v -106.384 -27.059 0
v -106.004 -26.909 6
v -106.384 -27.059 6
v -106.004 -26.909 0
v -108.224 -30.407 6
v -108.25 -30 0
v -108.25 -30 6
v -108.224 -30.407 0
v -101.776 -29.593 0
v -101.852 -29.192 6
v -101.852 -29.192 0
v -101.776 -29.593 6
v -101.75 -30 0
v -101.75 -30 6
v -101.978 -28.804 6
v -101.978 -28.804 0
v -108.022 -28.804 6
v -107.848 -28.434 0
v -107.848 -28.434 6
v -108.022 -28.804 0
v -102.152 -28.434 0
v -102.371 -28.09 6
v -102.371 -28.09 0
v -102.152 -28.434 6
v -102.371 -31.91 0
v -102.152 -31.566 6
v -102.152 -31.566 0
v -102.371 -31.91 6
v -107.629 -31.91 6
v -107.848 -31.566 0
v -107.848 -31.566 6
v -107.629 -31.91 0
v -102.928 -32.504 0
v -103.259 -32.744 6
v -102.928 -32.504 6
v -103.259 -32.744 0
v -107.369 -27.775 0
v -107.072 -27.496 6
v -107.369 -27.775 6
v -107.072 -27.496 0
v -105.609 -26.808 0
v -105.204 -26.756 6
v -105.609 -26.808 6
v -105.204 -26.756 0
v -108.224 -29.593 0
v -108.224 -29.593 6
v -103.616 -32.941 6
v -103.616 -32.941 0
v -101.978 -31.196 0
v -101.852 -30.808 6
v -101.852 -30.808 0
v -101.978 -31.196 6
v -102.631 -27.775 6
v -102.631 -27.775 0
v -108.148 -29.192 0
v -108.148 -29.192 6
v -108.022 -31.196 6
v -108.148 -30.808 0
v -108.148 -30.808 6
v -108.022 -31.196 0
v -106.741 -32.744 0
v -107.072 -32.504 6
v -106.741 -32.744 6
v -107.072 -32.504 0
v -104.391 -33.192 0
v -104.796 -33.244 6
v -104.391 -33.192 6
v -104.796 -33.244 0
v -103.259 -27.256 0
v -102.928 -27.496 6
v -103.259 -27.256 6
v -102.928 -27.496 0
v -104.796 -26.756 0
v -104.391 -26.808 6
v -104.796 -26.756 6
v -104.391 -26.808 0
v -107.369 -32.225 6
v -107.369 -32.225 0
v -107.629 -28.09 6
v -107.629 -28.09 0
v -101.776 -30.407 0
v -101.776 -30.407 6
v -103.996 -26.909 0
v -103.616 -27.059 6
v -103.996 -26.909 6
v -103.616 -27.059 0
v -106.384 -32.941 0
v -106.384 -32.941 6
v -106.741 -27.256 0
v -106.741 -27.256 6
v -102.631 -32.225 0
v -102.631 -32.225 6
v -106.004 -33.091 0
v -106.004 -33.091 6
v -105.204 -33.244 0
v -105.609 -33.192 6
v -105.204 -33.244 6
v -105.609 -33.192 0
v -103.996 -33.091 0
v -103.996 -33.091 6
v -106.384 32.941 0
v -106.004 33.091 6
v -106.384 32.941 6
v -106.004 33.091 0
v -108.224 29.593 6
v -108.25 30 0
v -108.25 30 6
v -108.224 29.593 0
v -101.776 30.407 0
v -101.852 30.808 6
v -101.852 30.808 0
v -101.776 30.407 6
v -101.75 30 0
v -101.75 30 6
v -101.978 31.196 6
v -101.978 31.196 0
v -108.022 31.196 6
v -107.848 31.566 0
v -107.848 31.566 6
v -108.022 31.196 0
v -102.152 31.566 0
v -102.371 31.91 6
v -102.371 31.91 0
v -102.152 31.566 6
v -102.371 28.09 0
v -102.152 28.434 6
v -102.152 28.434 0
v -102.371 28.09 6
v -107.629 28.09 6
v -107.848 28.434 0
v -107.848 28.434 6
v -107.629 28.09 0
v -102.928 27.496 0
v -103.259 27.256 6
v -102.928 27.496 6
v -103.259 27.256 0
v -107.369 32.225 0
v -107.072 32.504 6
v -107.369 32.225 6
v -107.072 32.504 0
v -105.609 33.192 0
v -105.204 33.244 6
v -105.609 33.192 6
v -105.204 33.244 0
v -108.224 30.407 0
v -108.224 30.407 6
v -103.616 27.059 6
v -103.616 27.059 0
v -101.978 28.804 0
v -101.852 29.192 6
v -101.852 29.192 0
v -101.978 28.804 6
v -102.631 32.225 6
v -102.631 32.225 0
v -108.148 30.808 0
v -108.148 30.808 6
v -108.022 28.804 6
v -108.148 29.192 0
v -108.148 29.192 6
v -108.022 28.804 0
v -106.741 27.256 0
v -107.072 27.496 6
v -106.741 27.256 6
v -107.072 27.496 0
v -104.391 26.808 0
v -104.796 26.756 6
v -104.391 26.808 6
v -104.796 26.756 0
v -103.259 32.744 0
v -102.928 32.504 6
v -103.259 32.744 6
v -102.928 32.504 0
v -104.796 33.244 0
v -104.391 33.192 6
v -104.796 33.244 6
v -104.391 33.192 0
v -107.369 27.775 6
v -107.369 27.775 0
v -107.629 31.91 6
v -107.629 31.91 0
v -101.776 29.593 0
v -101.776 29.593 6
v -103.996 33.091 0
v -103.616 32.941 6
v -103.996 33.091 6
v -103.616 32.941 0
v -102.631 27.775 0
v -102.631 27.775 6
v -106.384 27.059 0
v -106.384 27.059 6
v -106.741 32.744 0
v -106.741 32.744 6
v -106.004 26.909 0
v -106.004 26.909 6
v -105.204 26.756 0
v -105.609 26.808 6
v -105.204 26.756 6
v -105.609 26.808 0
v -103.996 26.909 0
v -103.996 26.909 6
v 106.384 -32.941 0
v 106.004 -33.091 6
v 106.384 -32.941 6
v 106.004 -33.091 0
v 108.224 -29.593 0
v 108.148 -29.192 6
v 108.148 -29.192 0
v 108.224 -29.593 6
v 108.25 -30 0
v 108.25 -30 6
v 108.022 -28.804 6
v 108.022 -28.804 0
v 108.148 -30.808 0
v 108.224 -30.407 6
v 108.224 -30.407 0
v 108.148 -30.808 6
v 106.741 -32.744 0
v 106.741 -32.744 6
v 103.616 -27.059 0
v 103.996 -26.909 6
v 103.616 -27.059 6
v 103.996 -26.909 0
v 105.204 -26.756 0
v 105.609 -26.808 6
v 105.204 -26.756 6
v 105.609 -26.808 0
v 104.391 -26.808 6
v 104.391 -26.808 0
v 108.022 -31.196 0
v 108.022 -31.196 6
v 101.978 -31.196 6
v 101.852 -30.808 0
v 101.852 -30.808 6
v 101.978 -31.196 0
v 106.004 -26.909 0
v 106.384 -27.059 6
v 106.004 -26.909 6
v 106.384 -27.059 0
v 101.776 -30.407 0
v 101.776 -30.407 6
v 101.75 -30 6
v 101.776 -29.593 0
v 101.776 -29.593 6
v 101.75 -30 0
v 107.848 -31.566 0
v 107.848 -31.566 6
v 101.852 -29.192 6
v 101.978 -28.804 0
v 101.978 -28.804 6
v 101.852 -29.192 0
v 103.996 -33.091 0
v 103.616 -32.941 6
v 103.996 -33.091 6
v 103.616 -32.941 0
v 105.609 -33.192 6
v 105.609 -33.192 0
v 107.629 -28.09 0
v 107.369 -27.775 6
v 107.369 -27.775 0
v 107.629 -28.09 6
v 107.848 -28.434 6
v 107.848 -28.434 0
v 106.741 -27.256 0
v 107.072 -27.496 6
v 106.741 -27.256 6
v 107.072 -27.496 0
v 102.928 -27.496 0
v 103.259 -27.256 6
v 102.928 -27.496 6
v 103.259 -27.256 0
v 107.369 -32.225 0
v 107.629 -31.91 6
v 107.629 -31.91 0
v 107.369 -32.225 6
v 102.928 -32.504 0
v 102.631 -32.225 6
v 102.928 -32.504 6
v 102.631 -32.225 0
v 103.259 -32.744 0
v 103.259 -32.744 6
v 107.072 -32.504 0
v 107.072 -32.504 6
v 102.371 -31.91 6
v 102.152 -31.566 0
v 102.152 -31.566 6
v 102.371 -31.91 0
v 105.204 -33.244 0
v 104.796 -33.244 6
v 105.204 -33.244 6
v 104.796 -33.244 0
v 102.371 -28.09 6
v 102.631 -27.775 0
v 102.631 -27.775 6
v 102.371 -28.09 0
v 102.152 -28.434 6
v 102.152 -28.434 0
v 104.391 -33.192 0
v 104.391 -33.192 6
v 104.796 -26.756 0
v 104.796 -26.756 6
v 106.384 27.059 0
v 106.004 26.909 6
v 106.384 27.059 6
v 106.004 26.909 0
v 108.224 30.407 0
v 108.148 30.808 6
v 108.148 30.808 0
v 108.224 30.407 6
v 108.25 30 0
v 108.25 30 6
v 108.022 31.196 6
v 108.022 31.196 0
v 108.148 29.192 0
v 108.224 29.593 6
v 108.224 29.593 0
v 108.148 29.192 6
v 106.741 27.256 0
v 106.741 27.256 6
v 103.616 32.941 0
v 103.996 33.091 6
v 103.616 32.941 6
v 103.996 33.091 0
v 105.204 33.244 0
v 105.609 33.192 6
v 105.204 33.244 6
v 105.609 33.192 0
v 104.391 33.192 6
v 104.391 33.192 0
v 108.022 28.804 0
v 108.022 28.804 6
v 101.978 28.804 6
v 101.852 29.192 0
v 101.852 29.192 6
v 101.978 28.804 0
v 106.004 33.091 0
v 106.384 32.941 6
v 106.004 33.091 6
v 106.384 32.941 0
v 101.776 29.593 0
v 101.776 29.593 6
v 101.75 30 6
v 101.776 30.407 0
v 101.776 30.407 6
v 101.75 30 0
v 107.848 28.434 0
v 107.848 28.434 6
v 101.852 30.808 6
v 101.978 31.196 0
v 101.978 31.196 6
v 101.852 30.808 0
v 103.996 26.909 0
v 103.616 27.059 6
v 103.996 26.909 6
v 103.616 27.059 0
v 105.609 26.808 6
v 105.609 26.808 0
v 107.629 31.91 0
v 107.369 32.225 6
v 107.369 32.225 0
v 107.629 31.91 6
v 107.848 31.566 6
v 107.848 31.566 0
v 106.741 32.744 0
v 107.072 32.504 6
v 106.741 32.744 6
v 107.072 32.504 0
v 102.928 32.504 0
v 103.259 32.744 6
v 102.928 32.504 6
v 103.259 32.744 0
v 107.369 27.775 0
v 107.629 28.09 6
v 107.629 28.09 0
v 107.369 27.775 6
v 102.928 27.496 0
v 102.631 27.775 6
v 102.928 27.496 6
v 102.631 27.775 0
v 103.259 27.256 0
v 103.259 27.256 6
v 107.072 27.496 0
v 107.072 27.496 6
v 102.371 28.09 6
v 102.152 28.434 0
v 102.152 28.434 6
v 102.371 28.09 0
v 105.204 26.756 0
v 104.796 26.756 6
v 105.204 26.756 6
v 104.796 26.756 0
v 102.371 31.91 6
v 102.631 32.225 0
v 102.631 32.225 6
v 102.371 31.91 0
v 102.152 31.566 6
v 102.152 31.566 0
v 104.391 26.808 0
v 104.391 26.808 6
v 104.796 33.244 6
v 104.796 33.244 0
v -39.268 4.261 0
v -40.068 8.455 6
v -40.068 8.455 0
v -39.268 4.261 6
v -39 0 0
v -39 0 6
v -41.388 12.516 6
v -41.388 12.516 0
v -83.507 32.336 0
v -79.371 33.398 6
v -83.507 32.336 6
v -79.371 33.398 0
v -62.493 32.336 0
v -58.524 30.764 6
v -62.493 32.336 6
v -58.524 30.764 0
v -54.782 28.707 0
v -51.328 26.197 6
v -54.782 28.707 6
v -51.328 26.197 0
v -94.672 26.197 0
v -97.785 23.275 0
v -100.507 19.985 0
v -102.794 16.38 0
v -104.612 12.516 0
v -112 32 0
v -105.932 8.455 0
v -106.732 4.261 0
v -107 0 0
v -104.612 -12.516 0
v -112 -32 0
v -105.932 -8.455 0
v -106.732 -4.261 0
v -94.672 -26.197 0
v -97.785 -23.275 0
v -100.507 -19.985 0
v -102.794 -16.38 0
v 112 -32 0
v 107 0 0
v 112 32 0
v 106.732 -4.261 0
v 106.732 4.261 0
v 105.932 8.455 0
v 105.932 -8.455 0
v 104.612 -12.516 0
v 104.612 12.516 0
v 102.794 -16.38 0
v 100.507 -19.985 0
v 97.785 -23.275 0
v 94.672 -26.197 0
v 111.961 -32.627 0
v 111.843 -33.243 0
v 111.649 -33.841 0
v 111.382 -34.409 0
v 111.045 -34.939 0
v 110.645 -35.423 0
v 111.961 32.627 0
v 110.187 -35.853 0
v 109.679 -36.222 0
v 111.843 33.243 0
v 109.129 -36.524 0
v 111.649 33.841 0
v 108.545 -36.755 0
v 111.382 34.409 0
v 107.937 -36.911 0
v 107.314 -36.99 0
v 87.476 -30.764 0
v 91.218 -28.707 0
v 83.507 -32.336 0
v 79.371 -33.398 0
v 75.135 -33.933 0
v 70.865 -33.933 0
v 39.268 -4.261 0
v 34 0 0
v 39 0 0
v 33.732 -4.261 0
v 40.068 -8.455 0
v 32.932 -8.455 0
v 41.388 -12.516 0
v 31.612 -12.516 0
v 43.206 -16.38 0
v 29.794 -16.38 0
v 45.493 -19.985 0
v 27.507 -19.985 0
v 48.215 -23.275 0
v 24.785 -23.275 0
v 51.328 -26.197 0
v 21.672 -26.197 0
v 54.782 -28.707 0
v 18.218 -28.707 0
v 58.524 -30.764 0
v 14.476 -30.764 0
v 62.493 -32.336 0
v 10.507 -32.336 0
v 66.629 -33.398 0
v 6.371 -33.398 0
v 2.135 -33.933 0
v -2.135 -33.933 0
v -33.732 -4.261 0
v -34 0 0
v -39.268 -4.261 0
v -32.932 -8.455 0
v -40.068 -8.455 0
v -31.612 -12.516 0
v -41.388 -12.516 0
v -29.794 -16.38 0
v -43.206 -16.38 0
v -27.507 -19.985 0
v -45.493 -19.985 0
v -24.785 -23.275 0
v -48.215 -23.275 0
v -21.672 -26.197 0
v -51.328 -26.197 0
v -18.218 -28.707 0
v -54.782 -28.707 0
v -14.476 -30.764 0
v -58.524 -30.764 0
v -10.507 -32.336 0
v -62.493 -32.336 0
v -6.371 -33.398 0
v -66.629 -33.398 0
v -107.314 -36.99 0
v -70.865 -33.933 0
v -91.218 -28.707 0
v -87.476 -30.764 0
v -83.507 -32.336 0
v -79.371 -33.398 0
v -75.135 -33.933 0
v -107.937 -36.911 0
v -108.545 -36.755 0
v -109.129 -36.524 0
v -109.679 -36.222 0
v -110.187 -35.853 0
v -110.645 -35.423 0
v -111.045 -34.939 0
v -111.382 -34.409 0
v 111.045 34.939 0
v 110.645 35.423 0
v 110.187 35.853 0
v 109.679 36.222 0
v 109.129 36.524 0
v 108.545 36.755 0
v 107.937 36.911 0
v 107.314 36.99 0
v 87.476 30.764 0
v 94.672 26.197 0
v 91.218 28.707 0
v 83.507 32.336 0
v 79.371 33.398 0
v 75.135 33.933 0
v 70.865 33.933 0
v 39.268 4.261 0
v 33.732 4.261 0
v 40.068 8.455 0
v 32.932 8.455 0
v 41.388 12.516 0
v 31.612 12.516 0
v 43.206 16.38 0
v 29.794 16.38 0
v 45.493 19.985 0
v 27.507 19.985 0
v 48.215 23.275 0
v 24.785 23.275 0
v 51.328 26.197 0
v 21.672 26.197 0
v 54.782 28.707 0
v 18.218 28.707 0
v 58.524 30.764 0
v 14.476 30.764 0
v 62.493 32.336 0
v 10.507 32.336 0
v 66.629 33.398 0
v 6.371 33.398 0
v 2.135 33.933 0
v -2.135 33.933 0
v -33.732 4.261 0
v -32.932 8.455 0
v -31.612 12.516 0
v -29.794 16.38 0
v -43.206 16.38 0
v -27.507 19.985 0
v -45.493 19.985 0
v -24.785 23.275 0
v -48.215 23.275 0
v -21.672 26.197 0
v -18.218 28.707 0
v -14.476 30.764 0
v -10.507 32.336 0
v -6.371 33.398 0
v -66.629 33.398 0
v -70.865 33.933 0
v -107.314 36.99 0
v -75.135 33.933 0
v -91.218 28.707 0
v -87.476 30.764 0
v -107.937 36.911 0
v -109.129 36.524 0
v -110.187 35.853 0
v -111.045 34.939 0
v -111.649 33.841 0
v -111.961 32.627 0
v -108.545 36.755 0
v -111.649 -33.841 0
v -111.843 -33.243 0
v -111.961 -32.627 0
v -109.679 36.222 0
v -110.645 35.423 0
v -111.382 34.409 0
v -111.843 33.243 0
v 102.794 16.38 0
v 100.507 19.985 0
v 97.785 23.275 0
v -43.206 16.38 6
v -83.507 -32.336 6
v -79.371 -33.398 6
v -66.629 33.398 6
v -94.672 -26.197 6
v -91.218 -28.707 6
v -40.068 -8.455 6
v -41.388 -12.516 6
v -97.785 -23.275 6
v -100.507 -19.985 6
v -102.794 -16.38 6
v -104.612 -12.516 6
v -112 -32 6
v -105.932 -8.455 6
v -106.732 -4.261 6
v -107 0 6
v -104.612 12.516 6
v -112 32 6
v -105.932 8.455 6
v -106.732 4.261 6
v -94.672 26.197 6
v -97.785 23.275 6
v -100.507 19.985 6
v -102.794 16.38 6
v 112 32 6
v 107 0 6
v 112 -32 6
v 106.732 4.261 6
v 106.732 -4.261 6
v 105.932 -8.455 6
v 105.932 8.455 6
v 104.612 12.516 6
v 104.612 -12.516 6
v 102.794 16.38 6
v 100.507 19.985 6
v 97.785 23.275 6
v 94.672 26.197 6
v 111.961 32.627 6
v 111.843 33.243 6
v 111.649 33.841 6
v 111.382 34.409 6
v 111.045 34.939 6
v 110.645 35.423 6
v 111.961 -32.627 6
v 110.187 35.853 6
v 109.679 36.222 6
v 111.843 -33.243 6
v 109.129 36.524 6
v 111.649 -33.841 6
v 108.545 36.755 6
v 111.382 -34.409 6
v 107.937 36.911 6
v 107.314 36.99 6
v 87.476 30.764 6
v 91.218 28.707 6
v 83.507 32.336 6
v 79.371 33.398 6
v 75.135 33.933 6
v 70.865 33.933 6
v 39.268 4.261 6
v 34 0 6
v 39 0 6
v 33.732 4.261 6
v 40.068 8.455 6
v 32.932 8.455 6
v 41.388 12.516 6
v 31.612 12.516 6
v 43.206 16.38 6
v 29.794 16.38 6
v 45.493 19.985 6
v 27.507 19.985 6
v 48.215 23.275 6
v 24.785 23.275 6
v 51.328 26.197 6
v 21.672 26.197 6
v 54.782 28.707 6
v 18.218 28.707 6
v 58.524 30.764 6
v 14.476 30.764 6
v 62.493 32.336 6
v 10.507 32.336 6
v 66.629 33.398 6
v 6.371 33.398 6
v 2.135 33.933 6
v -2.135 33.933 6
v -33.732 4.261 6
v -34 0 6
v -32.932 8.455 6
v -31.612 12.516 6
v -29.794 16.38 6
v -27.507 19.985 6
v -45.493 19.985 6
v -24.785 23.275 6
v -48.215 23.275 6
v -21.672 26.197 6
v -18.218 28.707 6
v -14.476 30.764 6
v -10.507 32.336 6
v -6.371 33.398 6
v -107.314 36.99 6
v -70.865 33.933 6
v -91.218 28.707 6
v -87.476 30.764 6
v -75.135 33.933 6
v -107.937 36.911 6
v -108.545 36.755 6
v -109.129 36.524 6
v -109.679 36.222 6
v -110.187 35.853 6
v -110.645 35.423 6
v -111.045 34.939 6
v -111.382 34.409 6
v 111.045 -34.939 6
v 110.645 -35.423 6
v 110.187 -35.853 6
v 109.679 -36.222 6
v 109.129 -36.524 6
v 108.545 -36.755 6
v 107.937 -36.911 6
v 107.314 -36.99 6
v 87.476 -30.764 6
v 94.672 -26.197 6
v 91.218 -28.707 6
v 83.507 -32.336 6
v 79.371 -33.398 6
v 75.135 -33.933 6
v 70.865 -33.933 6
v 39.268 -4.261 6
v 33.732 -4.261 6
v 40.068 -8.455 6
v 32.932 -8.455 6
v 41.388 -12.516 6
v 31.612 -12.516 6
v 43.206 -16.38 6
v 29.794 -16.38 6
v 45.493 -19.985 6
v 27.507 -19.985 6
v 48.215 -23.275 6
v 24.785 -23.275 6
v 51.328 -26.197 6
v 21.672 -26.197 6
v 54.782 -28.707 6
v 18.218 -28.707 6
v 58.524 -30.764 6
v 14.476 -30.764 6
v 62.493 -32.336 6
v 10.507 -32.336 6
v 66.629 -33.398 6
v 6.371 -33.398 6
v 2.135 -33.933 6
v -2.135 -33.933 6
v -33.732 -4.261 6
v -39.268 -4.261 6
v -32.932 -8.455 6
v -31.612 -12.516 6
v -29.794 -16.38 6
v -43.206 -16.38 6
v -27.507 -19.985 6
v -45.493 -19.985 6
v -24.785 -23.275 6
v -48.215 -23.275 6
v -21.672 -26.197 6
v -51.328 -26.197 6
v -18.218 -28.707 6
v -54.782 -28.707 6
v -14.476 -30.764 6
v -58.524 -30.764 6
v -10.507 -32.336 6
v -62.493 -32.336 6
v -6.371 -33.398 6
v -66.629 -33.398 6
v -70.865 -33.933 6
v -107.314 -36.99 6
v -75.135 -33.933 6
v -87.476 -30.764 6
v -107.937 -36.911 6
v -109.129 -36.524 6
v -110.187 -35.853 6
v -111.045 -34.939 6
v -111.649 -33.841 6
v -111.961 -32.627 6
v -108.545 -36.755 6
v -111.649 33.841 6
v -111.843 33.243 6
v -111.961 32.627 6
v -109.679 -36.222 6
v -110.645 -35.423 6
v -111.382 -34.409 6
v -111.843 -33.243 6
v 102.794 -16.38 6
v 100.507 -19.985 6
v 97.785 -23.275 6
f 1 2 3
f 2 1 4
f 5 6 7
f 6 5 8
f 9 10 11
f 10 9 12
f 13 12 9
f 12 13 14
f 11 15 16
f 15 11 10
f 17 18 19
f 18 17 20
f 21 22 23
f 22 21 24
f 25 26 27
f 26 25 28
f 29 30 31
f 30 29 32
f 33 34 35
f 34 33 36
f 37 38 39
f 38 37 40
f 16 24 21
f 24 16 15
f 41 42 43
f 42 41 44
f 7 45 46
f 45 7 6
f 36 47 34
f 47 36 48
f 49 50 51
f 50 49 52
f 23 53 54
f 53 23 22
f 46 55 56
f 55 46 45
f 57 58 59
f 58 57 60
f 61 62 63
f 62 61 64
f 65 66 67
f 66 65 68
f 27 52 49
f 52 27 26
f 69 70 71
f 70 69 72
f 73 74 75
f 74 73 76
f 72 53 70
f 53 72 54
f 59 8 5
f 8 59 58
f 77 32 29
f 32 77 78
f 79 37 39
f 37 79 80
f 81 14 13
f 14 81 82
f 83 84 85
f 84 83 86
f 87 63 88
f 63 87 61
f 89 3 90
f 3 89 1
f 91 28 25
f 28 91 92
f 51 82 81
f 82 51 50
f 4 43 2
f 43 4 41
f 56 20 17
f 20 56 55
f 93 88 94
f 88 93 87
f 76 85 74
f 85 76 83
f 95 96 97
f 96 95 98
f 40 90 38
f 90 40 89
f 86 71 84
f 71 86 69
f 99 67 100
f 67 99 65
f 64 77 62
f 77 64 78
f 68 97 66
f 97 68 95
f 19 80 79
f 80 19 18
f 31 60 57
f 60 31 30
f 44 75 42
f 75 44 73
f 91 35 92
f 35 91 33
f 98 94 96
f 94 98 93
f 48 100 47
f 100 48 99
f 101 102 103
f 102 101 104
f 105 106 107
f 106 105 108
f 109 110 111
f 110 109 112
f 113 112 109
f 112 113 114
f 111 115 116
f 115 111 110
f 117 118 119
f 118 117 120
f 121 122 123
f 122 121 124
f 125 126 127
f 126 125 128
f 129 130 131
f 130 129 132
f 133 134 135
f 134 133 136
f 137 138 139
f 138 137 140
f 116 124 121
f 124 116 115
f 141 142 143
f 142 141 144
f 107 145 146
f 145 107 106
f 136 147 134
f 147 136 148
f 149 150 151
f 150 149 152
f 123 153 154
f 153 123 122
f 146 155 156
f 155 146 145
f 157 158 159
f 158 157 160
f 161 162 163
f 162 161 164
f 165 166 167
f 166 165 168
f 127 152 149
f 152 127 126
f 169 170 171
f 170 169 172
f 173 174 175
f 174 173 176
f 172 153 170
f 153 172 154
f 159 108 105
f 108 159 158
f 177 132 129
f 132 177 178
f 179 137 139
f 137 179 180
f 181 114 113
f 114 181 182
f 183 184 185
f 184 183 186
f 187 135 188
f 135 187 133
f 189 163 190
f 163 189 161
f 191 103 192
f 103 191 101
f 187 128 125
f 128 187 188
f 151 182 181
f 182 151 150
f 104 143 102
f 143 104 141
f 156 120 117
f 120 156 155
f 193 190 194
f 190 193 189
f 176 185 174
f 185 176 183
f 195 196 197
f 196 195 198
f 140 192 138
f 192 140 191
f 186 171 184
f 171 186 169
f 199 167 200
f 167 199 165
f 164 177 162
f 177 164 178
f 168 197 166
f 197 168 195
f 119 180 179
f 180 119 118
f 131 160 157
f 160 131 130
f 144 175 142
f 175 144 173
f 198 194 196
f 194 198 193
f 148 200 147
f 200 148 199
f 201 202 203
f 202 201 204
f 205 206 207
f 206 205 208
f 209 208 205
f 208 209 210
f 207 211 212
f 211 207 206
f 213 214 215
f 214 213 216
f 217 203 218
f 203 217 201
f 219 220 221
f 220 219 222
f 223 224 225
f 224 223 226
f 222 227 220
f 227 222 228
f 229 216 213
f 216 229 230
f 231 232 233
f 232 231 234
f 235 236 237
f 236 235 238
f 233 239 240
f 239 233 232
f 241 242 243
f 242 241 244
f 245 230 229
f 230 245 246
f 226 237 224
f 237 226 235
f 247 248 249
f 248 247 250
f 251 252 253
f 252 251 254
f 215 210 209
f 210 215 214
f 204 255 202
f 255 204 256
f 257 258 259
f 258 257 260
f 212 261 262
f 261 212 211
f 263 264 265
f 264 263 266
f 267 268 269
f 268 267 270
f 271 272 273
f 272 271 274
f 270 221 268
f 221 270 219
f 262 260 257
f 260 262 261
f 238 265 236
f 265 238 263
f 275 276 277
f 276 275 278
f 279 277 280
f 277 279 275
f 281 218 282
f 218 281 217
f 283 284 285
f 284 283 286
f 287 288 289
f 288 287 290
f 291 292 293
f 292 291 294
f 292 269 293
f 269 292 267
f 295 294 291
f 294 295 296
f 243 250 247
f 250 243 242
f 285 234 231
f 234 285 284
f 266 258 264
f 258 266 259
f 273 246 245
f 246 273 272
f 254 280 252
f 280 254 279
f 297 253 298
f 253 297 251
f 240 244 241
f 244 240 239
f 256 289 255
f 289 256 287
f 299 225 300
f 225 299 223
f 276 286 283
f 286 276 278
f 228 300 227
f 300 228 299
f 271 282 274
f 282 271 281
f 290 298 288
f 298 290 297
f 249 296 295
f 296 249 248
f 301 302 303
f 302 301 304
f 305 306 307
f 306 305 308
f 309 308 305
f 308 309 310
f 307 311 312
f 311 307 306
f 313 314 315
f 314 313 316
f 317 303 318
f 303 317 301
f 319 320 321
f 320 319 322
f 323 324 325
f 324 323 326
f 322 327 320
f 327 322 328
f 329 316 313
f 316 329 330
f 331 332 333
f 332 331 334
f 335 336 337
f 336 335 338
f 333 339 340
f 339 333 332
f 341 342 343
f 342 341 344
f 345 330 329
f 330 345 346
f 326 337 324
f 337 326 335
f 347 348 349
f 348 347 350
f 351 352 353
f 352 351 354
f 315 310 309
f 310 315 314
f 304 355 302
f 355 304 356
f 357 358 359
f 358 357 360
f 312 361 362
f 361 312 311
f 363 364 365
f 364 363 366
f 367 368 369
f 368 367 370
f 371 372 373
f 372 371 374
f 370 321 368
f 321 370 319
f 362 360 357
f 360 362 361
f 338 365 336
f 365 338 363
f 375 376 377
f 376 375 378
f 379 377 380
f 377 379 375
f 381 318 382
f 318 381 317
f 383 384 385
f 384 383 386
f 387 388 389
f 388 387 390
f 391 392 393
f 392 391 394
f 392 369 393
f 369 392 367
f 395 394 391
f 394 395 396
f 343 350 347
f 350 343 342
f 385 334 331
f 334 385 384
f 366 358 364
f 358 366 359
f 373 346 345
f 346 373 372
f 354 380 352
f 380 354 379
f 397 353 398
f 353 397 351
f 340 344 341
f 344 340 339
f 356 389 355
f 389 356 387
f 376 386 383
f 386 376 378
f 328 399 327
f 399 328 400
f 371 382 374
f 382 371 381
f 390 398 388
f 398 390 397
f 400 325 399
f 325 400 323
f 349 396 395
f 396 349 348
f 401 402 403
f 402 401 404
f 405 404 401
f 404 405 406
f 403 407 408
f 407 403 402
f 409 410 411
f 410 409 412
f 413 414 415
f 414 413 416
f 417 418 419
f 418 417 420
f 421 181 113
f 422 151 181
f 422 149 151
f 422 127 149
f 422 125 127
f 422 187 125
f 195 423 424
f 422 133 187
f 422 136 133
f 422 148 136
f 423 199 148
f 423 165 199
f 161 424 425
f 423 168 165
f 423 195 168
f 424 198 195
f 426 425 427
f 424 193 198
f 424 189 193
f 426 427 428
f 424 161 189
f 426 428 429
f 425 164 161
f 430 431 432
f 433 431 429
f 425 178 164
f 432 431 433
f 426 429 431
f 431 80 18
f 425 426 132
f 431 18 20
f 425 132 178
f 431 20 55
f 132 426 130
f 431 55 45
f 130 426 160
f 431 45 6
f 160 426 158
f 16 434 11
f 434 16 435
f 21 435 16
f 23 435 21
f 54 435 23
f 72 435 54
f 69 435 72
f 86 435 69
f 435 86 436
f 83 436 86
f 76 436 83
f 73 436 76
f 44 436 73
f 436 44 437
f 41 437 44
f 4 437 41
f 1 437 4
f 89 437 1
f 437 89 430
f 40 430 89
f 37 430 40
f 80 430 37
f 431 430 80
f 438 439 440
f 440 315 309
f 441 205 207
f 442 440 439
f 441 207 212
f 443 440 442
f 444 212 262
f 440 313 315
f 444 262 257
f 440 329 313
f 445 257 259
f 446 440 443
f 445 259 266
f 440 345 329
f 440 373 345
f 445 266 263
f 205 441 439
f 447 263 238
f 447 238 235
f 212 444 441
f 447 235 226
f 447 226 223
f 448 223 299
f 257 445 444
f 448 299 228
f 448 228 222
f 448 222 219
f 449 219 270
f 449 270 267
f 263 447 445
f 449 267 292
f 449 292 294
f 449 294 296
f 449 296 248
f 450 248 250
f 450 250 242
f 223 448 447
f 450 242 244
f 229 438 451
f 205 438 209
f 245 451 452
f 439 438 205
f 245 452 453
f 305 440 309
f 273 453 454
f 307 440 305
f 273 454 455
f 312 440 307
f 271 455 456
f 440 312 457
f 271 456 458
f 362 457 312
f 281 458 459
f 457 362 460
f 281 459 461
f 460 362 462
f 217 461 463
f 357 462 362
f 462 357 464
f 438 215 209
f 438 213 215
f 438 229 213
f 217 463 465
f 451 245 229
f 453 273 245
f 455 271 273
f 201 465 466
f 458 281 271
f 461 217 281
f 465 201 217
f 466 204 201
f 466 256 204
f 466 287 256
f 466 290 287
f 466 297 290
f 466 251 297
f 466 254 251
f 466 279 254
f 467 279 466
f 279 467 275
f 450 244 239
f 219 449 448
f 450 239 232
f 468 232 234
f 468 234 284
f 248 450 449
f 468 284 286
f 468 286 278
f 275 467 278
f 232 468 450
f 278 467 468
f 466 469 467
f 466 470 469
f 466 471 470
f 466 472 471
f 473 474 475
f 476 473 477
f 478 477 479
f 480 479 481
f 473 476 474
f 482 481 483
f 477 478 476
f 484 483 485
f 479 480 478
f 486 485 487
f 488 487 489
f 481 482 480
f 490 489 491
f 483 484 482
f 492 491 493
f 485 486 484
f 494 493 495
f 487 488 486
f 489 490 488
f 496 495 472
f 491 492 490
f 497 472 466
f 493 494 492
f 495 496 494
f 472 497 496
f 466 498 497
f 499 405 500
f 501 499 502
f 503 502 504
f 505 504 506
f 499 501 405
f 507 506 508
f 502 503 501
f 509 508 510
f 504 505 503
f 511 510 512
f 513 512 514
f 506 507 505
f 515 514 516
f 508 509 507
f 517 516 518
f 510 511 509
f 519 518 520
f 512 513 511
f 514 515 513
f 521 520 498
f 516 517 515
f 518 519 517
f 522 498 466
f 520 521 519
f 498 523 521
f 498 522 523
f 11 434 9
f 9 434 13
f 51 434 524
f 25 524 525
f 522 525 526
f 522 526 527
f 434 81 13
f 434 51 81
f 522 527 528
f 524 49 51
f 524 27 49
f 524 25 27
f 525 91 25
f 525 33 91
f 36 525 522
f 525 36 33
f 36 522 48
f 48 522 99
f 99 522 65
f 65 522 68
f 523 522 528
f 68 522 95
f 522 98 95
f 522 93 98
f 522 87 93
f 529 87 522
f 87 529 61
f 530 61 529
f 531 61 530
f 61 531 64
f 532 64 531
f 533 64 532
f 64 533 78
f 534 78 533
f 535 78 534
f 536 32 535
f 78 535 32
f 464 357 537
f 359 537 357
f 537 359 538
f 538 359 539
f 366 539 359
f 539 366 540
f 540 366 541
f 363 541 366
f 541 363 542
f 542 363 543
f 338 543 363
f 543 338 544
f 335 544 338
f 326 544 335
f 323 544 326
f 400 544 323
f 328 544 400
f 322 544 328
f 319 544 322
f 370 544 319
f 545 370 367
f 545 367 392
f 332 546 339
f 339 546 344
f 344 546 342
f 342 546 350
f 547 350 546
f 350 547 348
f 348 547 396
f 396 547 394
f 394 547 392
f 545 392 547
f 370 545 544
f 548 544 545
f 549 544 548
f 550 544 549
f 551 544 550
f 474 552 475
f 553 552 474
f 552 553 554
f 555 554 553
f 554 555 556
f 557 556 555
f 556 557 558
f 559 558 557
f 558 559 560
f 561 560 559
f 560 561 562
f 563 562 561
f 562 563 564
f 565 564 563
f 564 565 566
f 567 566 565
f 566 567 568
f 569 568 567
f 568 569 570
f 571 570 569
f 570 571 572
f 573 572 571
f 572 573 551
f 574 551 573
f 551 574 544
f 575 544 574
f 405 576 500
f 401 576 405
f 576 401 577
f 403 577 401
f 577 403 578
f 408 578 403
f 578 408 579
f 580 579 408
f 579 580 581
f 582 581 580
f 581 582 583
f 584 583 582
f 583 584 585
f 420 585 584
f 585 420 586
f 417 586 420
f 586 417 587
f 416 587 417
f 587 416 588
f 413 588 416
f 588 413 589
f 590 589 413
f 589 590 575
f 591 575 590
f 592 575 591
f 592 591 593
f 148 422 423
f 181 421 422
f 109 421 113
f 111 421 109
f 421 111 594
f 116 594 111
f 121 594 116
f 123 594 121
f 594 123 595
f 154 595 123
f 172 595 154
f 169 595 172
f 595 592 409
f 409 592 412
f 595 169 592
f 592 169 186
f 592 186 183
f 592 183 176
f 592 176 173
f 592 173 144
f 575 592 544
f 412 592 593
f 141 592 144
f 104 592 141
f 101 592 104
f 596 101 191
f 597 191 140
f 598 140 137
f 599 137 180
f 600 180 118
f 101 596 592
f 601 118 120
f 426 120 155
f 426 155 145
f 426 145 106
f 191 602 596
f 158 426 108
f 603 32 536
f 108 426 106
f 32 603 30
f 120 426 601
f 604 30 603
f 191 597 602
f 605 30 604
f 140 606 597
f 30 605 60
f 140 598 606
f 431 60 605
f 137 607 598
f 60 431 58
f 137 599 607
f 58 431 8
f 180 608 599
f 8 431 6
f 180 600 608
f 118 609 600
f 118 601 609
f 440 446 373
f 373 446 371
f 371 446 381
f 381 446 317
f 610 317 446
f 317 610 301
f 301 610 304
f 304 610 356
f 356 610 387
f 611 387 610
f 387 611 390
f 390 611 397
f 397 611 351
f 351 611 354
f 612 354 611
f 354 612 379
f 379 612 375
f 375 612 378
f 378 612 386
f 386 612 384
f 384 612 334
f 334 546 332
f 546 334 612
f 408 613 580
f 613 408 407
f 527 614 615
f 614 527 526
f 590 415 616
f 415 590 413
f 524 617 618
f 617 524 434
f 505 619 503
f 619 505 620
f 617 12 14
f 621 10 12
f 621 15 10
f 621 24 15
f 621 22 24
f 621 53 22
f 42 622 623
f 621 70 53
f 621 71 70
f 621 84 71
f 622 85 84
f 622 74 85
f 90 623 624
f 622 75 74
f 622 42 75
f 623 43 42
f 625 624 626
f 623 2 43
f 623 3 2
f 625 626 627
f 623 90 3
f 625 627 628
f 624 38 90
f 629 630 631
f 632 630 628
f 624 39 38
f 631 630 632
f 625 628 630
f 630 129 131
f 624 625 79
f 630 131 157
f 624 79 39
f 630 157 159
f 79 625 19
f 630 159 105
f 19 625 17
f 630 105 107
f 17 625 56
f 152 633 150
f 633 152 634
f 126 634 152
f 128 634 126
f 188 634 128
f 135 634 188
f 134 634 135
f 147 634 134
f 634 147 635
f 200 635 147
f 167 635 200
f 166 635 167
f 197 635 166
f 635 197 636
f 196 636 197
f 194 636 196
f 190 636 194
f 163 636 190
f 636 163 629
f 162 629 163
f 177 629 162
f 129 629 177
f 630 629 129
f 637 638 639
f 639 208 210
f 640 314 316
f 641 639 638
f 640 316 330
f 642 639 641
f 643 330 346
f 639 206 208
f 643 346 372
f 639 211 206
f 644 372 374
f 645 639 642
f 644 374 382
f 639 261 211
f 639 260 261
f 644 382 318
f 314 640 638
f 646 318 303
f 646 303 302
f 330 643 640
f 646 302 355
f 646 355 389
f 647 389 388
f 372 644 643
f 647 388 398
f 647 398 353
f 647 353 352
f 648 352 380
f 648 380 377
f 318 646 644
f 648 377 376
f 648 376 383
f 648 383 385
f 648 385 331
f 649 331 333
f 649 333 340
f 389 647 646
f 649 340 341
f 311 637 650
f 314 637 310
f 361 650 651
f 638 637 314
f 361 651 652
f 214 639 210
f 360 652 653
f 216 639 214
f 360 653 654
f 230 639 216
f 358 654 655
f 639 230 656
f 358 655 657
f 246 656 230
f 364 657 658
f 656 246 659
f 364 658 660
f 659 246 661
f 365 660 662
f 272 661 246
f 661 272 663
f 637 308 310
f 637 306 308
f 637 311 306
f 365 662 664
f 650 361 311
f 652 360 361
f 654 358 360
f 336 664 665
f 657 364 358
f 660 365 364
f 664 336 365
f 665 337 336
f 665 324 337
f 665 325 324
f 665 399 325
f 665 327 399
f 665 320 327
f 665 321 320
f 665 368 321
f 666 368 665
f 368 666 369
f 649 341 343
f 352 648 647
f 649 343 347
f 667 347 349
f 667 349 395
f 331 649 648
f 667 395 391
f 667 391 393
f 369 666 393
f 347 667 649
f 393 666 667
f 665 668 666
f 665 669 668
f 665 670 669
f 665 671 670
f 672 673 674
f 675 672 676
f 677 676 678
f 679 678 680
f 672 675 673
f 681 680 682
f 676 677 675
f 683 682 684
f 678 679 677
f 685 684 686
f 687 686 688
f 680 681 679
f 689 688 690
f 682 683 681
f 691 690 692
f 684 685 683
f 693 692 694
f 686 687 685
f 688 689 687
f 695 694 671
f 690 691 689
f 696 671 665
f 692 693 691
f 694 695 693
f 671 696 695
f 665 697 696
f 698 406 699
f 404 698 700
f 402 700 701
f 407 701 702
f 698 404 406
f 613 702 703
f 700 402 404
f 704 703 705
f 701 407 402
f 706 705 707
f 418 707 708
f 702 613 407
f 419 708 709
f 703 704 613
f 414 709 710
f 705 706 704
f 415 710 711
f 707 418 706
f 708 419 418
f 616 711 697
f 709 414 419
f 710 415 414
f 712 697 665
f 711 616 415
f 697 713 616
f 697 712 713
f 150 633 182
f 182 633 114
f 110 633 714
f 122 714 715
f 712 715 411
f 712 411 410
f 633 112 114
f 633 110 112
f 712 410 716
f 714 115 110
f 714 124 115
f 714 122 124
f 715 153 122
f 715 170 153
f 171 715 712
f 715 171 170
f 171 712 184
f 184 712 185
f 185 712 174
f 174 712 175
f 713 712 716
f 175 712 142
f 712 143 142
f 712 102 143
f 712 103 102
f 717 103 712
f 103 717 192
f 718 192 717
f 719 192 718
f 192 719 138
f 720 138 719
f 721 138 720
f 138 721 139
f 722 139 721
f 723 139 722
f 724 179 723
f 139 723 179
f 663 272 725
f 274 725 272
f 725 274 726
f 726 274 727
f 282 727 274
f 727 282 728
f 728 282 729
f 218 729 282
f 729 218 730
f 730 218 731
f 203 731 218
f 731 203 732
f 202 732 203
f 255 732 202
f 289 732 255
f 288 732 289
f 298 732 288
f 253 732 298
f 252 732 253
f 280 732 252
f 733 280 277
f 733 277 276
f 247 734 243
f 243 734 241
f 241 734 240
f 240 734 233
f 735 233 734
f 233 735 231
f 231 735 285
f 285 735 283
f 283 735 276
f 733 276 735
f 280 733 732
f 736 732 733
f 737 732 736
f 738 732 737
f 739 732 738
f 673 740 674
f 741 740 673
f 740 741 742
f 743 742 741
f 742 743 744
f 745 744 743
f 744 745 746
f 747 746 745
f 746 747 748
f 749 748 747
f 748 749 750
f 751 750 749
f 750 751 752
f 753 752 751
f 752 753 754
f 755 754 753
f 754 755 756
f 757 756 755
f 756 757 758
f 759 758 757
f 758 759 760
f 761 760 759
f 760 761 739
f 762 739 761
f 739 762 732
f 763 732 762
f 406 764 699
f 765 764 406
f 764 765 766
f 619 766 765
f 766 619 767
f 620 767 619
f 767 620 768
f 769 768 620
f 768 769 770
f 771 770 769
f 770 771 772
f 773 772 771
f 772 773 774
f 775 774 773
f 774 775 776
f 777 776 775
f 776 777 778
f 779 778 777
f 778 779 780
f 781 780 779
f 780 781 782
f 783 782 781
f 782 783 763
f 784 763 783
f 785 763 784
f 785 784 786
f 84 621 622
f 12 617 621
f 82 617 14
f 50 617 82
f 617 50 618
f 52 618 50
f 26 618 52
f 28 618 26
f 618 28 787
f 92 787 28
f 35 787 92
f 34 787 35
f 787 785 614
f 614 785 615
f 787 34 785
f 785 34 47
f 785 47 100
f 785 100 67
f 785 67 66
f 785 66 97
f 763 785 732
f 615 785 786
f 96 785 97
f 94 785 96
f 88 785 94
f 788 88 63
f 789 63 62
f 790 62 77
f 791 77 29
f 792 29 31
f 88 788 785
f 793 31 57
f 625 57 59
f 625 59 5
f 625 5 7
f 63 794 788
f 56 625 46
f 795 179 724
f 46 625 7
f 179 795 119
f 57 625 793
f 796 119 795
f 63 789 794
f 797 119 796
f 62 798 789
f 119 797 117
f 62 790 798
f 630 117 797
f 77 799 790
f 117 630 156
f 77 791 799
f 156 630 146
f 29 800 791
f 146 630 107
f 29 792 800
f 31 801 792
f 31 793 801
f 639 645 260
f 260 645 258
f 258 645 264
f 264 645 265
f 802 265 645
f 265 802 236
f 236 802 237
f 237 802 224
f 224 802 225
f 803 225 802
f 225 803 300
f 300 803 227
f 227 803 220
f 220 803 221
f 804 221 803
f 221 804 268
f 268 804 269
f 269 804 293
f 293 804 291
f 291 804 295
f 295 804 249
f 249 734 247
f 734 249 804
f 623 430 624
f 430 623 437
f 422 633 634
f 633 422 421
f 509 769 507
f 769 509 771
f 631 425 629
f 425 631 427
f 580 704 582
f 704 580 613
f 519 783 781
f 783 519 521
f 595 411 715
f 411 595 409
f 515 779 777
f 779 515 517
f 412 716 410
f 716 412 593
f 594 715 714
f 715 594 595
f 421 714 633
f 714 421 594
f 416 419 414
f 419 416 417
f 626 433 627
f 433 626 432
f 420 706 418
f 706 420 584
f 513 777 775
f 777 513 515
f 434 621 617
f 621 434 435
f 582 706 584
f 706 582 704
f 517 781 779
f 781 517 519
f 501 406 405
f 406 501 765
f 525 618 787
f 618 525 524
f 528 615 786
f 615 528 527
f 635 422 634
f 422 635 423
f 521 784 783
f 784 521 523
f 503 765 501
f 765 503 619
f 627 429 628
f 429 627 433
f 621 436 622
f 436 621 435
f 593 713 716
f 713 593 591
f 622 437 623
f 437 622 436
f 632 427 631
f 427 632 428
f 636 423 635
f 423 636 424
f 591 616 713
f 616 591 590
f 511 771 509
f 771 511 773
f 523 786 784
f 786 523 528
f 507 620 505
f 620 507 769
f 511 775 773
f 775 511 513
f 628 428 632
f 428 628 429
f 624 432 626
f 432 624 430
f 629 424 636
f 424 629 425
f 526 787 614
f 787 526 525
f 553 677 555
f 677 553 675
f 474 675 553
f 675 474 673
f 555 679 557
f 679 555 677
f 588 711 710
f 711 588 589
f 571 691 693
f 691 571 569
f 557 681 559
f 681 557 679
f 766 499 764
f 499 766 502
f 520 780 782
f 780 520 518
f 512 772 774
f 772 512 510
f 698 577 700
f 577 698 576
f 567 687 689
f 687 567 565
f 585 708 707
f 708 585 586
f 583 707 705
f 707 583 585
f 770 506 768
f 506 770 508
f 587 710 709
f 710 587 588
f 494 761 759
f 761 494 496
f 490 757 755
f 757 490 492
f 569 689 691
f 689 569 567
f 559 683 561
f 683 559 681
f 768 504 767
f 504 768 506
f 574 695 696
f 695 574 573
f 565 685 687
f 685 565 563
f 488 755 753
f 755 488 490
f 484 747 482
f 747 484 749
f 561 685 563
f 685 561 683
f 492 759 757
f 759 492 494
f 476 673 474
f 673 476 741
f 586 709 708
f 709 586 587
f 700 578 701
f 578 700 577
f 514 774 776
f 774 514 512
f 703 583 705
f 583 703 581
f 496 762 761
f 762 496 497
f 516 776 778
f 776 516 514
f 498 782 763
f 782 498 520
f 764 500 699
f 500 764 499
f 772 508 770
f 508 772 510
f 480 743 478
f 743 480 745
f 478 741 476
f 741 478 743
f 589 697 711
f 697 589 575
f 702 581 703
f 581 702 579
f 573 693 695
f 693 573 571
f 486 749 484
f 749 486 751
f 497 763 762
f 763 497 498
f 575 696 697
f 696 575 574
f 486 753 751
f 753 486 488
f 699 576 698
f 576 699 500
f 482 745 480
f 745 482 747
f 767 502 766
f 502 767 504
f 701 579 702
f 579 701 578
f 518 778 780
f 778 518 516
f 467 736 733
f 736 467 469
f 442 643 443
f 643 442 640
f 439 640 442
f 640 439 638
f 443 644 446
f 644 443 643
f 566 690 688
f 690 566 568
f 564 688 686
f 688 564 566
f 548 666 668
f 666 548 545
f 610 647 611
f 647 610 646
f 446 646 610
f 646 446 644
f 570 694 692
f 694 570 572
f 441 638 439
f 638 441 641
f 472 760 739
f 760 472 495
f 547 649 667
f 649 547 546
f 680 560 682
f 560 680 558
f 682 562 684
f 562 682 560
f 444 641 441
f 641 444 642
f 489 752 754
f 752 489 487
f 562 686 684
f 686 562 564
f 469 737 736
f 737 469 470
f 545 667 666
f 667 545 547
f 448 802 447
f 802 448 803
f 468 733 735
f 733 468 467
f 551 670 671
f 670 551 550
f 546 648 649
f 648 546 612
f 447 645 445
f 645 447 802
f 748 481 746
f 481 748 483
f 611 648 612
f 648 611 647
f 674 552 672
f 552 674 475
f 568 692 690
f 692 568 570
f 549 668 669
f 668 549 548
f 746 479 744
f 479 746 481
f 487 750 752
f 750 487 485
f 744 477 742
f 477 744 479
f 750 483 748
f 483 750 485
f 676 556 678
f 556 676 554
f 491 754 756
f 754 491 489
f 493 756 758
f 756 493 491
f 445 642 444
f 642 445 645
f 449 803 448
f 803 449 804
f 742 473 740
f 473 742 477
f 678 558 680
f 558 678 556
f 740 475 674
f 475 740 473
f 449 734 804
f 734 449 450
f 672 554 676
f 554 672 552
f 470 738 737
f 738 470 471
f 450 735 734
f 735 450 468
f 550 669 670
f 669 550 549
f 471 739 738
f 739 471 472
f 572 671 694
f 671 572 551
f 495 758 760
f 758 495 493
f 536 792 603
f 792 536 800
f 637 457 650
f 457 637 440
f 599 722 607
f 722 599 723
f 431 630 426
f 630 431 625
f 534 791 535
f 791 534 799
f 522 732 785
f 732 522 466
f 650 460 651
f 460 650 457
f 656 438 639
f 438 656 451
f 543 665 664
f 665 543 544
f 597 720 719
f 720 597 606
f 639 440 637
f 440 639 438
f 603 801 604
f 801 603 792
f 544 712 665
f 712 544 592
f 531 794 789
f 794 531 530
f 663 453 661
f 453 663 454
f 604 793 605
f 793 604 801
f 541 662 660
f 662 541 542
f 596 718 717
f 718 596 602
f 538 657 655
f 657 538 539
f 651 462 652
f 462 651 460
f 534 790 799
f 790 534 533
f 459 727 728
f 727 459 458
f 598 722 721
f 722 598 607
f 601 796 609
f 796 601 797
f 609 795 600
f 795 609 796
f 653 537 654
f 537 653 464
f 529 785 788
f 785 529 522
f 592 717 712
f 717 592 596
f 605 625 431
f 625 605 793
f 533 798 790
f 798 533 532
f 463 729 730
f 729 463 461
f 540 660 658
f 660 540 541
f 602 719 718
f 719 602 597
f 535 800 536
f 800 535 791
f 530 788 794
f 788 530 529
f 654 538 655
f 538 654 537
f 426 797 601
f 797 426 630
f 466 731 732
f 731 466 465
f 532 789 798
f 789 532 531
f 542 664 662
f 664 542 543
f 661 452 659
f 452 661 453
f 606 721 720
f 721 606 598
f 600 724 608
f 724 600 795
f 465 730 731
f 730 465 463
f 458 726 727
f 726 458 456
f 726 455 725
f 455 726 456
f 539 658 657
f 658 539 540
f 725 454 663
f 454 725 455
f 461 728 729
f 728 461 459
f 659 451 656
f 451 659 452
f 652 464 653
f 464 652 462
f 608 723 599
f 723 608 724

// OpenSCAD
$fn = 50;

difference() {
	union() {
		hull() {
			translate(v = [-107.0, 32.0, 0]) {
				cylinder(h = 6, r = 5);
			}
			translate(v = [107.0, 32.0, 0]) {
				cylinder(h = 6, r = 5);
			}
			translate(v = [-107.0, -32.0, 0]) {
				cylinder(h = 6, r = 5);
			}
			translate(v = [107.0, -32.0, 0]) {
				cylinder(h = 6, r = 5);
			}
		}
	}
	union() {
		translate(v = [-105.0, -30.0, -100.0]) {
			cylinder(h = 200, r = 3.25);
		}
		translate(v = [-105.0, 30.0, -100.0]) {
			cylinder(h = 200, r = 3.25);
		}
		translate(v = [105.0, -30.0, -100.0]) {
			cylinder(h = 200, r = 3.25);
		}
		translate(v = [105.0, 30.0, -100.0]) {
			cylinder(h = 200, r = 3.25);
		}
		translate(v = [-105.0, -30.0, -100.0]) {
			cylinder(h = 200, r = 1.8);
		}
		translate(v = [-105.0, 30.0, -100.0]) {
			cylinder(h = 200, r = 1.8);
		}
		translate(v = [105.0, -30.0, -100.0]) {
			cylinder(h = 200, r = 1.8);
		}
		translate(v = [105.0, 30.0, -100.0]) {
			cylinder(h = 200, r = 1.8);
		}
		translate(v = [-73.0, 0, 0.0]) {
			cylinder(h = 6, r = 34.0);
		}
		cylinder(h = 6, r = 34.0);
		translate(v = [73.0, 0, 0.0]) {
			cylinder(h = 6, r = 34.0);
		}
	}
}
